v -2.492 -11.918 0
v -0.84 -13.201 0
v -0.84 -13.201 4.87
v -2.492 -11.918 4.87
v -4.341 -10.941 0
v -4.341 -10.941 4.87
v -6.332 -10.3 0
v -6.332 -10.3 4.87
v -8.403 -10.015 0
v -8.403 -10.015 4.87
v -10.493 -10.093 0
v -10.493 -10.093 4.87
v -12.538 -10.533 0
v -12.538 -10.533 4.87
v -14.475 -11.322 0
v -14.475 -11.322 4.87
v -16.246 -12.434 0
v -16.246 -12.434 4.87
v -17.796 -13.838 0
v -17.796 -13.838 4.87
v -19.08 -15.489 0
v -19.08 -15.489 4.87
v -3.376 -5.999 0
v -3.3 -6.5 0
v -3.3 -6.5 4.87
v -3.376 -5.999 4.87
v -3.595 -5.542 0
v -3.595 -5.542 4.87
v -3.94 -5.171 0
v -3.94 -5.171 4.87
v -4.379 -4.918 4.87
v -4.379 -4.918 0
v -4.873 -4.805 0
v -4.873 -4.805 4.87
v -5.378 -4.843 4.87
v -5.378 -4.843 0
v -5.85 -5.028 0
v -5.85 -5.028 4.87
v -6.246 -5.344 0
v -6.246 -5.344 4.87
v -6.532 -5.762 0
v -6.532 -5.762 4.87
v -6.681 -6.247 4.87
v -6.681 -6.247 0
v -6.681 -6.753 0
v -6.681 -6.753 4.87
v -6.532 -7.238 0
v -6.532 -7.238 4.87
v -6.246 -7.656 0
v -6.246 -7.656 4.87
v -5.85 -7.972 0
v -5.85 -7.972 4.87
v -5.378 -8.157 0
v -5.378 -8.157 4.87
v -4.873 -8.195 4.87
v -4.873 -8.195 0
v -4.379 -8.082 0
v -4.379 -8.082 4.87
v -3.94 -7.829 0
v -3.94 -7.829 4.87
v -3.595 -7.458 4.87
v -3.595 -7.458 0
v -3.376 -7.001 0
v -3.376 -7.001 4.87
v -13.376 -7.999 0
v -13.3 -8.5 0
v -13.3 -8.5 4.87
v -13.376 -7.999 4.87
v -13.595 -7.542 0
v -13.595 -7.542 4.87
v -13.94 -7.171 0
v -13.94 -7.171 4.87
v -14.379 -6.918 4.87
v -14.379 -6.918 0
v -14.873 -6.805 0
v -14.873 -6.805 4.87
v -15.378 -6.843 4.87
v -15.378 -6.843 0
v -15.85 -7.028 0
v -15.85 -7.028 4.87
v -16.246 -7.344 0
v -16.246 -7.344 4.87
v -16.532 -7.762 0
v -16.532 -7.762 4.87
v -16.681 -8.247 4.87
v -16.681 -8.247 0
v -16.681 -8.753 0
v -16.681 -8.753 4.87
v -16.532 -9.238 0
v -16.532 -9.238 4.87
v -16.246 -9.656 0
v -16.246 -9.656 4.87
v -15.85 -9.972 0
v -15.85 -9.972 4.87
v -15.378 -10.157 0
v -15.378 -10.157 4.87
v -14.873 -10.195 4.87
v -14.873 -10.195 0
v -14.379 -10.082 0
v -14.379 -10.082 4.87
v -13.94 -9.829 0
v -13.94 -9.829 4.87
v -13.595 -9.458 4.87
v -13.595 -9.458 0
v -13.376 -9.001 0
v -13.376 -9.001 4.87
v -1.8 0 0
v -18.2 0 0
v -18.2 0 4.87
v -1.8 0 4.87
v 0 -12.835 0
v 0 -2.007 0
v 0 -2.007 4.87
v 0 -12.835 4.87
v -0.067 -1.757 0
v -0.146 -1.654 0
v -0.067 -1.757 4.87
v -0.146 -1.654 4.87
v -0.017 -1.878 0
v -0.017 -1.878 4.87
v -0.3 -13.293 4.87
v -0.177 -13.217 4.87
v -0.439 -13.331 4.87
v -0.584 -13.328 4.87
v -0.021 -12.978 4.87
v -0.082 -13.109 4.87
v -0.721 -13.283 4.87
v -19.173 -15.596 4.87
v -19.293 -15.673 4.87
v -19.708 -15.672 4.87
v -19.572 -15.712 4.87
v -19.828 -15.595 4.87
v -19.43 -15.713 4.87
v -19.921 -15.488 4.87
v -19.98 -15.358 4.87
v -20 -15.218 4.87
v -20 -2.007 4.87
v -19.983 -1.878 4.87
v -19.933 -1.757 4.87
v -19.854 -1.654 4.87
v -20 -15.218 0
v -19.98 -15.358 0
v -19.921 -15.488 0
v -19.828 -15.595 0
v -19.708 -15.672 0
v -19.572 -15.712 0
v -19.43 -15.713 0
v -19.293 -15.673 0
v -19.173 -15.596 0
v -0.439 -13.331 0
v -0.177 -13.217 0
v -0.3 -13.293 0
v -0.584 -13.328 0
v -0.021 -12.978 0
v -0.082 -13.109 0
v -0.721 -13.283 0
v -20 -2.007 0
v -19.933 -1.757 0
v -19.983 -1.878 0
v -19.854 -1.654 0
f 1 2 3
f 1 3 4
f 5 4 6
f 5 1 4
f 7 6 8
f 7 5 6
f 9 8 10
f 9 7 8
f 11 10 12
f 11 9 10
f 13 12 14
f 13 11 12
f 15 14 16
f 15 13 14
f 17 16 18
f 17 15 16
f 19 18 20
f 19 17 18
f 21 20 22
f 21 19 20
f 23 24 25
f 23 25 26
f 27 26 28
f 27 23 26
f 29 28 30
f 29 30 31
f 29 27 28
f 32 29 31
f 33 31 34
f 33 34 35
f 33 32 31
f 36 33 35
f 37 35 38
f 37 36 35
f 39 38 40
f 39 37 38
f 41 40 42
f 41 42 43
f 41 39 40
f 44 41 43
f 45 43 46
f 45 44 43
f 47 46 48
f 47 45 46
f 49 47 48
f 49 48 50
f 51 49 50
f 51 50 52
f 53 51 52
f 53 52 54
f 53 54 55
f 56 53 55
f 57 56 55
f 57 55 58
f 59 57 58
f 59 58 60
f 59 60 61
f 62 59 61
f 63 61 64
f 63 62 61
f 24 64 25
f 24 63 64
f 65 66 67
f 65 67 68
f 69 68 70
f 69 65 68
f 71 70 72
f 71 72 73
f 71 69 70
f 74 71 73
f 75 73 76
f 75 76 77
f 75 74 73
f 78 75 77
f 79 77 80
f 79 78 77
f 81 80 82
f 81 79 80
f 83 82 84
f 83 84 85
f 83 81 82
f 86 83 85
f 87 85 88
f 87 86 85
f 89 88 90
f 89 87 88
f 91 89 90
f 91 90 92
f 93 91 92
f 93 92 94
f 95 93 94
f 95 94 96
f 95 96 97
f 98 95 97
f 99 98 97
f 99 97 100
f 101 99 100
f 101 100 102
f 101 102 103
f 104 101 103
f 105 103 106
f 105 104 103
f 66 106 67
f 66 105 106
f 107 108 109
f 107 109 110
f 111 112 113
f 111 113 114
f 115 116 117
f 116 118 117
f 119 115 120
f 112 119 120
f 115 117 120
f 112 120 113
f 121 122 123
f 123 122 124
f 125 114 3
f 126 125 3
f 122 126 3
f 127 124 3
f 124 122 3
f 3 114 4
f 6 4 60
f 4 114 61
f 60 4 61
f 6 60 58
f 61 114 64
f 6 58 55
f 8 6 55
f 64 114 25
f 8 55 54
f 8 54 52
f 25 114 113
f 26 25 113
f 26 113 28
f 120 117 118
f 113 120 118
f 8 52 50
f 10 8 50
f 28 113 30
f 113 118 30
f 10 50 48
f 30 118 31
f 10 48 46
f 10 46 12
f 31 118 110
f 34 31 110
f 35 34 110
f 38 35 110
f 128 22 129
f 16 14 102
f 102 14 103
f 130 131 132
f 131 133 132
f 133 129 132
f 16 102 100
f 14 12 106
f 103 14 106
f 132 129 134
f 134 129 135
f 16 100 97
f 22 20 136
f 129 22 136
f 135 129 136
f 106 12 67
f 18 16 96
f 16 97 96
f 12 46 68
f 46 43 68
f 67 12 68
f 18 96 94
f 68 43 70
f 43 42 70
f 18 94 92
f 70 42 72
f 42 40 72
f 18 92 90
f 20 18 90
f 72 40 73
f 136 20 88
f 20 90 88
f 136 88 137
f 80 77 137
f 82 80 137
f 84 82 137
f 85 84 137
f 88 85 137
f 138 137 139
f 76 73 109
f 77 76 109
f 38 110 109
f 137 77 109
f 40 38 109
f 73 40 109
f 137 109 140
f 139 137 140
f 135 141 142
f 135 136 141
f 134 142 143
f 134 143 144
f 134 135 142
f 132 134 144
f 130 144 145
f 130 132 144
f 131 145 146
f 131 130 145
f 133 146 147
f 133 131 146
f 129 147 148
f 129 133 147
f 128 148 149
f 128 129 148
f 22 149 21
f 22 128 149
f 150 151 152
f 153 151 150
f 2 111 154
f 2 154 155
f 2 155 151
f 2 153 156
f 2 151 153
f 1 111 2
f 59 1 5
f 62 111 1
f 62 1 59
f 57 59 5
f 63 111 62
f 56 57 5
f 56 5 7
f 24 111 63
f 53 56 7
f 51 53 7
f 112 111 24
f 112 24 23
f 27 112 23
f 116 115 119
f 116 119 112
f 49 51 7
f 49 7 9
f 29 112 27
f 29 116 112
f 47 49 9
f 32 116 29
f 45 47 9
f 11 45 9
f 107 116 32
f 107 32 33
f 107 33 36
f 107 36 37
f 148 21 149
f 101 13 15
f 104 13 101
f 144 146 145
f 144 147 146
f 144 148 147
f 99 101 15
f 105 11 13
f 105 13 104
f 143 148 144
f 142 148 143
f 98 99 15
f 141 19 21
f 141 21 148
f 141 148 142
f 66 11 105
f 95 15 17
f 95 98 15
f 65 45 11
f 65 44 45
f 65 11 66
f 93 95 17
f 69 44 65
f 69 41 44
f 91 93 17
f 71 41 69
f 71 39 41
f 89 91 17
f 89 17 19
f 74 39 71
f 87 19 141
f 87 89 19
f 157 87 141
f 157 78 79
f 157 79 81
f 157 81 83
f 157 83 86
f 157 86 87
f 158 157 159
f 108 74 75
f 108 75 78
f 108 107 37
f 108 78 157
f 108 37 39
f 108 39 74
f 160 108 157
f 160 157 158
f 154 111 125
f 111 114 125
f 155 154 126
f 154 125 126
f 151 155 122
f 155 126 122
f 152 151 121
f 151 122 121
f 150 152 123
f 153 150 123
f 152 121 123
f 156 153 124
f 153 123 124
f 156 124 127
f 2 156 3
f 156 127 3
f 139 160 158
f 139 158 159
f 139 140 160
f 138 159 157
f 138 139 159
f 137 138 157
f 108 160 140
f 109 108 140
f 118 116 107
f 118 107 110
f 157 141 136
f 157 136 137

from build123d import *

# Parameters (mm, degrees)
SKETCH1_R           = 1.7
BOSS_EXTRUDE1_DEPTH = 4.87
CHAMFER1_SIZE       = 1.8
FILLET1_R           = 0.5


with BuildPart() as part:
    # Sketch1 → Boss-Extrude1 (new body)
    with BuildSketch(Plane.XY):
        with BuildLine():
            Line((-20, 0), (0, 0))
            Line((0, 0), (0, -14.062746067))
            ThreePointArc((0, -14.062746067), (-10.862024084, -10.145344108), (-20, -17.204168477))
            Line((-20, -17.204168477), (-20, 0))
        make_face()
        with Locations((-15, -8.5)):
            Circle(SKETCH1_R, mode=Mode.SUBTRACT)
        with Locations((-5, -6.5)):
            Circle(SKETCH1_R, mode=Mode.SUBTRACT)
    extrude(amount=BOSS_EXTRUDE1_DEPTH)

    # Chamfer1
    chamfer1_edges = [part.edges().sort_by_distance(p)[0] for p in [
        (-20, 0, 2.435),
        (0, 0, 2.435),
    ]]
    chamfer(chamfer1_edges, length=CHAMFER1_SIZE)

    # Fillet1
    fillet1_edges = [part.edges().sort_by_distance(p)[0] for p in [
        (0, -1.8, 2.435),
        (-20, -1.8, 2.435),
        (0, -14.062746067, 2.435),
        (-20, -17.204168477, 2.435),
    ]]
    fillet(fillet1_edges, radius=FILLET1_R)


solid = part.part
